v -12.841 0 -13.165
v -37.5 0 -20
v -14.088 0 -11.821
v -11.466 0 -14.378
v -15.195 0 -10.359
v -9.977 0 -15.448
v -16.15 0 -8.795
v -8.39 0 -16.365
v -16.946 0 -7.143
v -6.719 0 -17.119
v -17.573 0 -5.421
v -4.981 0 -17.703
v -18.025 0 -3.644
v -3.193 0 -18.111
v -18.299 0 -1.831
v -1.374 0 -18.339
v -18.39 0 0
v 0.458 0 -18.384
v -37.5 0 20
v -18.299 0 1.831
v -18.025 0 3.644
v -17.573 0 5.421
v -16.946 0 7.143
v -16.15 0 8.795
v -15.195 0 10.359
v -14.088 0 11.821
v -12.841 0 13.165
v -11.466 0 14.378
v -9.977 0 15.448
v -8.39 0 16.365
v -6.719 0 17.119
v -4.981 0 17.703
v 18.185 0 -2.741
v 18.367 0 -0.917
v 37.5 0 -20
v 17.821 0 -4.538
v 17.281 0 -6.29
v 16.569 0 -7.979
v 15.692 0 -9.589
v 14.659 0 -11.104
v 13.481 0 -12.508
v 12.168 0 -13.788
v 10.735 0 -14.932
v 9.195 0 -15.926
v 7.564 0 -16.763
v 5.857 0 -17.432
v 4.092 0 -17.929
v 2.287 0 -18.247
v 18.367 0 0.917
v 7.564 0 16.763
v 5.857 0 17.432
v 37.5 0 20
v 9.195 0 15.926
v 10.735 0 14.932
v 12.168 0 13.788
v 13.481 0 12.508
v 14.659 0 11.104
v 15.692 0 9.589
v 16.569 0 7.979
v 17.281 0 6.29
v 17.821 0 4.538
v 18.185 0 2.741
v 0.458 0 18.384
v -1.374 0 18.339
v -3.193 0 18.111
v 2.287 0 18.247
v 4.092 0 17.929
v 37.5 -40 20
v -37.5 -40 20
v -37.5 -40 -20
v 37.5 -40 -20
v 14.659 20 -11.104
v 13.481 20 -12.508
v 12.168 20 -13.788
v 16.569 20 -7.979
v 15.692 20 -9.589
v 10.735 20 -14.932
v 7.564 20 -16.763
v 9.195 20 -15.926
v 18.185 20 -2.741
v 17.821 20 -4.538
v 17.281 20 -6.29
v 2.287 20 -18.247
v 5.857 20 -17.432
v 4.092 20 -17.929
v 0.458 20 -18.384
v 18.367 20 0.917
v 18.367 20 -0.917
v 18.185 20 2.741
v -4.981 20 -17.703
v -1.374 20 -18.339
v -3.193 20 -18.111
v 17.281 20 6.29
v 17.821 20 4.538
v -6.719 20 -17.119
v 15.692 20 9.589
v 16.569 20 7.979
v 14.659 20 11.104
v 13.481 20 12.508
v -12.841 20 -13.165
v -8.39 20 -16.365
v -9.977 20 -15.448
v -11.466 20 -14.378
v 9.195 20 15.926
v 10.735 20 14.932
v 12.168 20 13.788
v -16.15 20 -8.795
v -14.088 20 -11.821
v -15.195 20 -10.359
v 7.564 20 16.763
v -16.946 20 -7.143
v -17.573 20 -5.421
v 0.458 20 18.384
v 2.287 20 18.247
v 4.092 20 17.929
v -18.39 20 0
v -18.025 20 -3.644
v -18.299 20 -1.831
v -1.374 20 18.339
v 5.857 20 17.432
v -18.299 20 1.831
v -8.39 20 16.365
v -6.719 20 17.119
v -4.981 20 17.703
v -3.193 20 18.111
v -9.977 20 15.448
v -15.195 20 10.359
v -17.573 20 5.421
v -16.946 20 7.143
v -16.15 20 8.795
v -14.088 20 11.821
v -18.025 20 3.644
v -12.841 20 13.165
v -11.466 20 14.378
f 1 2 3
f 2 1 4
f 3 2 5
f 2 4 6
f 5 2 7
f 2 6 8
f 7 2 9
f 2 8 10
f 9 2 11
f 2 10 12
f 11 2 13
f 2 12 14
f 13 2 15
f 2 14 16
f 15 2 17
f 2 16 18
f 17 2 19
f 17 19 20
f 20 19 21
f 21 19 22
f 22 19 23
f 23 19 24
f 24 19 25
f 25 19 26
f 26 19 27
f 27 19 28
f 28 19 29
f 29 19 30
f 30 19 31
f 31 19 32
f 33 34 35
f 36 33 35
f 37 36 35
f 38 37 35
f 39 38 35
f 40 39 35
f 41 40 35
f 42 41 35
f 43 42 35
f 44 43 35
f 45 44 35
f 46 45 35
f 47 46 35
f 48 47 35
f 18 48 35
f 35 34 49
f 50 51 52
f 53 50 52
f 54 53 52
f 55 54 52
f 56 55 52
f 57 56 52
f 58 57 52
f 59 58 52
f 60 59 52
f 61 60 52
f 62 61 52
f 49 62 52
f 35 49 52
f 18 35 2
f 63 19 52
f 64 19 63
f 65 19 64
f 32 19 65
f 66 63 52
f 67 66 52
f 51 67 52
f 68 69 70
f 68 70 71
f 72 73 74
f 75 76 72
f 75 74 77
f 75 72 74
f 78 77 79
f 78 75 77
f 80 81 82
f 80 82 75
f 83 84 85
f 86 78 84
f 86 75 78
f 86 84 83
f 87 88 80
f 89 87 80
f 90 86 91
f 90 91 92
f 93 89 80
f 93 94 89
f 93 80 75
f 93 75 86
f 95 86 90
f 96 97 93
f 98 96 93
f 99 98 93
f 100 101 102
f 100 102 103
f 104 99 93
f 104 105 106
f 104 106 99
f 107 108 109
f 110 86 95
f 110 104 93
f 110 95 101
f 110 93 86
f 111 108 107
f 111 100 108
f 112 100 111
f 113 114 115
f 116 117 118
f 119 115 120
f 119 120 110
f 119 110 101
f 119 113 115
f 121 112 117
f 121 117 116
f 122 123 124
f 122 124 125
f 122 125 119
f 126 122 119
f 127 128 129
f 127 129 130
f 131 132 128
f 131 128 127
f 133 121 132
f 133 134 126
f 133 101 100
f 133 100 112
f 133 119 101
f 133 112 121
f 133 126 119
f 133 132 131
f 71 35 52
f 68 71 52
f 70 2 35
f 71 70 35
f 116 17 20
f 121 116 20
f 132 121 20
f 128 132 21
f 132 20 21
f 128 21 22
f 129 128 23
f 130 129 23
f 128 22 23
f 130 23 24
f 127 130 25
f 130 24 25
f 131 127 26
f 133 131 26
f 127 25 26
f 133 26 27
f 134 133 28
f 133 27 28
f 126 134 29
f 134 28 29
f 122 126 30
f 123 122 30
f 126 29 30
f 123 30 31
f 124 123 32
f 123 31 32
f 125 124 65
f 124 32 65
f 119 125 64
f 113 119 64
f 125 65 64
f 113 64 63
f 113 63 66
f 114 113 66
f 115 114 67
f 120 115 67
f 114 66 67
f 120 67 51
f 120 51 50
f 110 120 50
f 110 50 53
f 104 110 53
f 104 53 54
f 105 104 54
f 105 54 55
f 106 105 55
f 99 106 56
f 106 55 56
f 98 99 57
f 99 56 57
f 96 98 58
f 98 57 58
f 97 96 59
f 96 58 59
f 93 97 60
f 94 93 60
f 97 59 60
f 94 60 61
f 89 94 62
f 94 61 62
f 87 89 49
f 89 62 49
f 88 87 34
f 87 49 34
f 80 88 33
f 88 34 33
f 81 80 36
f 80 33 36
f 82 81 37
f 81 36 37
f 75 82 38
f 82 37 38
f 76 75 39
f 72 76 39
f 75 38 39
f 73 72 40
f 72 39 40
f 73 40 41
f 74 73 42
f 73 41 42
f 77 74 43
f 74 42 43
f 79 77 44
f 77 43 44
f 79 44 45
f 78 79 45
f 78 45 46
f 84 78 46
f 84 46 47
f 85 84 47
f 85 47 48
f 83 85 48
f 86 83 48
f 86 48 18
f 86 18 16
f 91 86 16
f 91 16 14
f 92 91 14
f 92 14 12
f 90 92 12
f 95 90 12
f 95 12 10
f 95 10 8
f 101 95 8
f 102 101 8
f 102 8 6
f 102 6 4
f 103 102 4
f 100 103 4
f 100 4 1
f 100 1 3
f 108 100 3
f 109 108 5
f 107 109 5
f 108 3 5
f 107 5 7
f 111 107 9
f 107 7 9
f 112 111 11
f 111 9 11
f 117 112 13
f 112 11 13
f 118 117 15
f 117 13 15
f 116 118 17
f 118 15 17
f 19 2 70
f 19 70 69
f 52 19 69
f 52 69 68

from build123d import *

# Parameters (mm, degrees)
SKIZZE1_W                          = 75
SKIZZE1_H                          = 40
AUFSATZ_LINEAR_AUSTRAGEN1_DEPTH    = 40
SKIZZE2_R                          = 18.39
AUFSATZ_LINEAR_AUSTRAGEN2_DEPTH    = 20
K_RPER_VERSCHIEBEN_KOPIEREN1_ANGLE = 180
K_RPER_VERSCHIEBEN_KOPIEREN2_ANGLE = 90
K_RPER_VERSCHIEBEN_KOPIEREN3_ANGLE = 180


with BuildPart() as part:
    # Skizze1 → Aufsatz-Linear austragen1 (new body)
    with BuildSketch(Plane.XY):
        Rectangle(SKIZZE1_W, SKIZZE1_H)
    extrude(amount=AUFSATZ_LINEAR_AUSTRAGEN1_DEPTH)

    # Skizze2 → Aufsatz-Linear austragen2 (add)
    with BuildSketch(Plane(origin=(0, 0, 0), x_dir=(-1, 0, 0), z_dir=(0, 0, -1))):
        Circle(SKIZZE2_R)
    extrude(amount=AUFSATZ_LINEAR_AUSTRAGEN2_DEPTH)


with BuildPart() as part_1:
    # Körper-Verschieben/Kopieren1: moved
    add(part.part.rotate(Axis((0, 0, 10), (1, 0, 0)), K_RPER_VERSCHIEBEN_KOPIEREN1_ANGLE))


with BuildPart() as part_2:
    # Körper-Verschieben/Kopieren2: moved
    add(part_1.part.rotate(Axis((0, 0, 10), (1, 0, 0)), K_RPER_VERSCHIEBEN_KOPIEREN2_ANGLE))


with BuildPart() as part_3:
    # Körper-Verschieben/Kopieren3: moved
    add(part_2.part.rotate(Axis((0, 0, 10), (1, 0, 0)), K_RPER_VERSCHIEBEN_KOPIEREN3_ANGLE))


with BuildPart() as part_4:
    # Körper-Verschieben/Kopieren4: moved
    add(part_3.part.moved(Location((0, -10, 0))))


with BuildPart() as part_5:
    # Körper-Verschieben/Kopieren5: moved
    add(part_4.part.moved(Location((0, 0, -10))))


solid = part_5.part
